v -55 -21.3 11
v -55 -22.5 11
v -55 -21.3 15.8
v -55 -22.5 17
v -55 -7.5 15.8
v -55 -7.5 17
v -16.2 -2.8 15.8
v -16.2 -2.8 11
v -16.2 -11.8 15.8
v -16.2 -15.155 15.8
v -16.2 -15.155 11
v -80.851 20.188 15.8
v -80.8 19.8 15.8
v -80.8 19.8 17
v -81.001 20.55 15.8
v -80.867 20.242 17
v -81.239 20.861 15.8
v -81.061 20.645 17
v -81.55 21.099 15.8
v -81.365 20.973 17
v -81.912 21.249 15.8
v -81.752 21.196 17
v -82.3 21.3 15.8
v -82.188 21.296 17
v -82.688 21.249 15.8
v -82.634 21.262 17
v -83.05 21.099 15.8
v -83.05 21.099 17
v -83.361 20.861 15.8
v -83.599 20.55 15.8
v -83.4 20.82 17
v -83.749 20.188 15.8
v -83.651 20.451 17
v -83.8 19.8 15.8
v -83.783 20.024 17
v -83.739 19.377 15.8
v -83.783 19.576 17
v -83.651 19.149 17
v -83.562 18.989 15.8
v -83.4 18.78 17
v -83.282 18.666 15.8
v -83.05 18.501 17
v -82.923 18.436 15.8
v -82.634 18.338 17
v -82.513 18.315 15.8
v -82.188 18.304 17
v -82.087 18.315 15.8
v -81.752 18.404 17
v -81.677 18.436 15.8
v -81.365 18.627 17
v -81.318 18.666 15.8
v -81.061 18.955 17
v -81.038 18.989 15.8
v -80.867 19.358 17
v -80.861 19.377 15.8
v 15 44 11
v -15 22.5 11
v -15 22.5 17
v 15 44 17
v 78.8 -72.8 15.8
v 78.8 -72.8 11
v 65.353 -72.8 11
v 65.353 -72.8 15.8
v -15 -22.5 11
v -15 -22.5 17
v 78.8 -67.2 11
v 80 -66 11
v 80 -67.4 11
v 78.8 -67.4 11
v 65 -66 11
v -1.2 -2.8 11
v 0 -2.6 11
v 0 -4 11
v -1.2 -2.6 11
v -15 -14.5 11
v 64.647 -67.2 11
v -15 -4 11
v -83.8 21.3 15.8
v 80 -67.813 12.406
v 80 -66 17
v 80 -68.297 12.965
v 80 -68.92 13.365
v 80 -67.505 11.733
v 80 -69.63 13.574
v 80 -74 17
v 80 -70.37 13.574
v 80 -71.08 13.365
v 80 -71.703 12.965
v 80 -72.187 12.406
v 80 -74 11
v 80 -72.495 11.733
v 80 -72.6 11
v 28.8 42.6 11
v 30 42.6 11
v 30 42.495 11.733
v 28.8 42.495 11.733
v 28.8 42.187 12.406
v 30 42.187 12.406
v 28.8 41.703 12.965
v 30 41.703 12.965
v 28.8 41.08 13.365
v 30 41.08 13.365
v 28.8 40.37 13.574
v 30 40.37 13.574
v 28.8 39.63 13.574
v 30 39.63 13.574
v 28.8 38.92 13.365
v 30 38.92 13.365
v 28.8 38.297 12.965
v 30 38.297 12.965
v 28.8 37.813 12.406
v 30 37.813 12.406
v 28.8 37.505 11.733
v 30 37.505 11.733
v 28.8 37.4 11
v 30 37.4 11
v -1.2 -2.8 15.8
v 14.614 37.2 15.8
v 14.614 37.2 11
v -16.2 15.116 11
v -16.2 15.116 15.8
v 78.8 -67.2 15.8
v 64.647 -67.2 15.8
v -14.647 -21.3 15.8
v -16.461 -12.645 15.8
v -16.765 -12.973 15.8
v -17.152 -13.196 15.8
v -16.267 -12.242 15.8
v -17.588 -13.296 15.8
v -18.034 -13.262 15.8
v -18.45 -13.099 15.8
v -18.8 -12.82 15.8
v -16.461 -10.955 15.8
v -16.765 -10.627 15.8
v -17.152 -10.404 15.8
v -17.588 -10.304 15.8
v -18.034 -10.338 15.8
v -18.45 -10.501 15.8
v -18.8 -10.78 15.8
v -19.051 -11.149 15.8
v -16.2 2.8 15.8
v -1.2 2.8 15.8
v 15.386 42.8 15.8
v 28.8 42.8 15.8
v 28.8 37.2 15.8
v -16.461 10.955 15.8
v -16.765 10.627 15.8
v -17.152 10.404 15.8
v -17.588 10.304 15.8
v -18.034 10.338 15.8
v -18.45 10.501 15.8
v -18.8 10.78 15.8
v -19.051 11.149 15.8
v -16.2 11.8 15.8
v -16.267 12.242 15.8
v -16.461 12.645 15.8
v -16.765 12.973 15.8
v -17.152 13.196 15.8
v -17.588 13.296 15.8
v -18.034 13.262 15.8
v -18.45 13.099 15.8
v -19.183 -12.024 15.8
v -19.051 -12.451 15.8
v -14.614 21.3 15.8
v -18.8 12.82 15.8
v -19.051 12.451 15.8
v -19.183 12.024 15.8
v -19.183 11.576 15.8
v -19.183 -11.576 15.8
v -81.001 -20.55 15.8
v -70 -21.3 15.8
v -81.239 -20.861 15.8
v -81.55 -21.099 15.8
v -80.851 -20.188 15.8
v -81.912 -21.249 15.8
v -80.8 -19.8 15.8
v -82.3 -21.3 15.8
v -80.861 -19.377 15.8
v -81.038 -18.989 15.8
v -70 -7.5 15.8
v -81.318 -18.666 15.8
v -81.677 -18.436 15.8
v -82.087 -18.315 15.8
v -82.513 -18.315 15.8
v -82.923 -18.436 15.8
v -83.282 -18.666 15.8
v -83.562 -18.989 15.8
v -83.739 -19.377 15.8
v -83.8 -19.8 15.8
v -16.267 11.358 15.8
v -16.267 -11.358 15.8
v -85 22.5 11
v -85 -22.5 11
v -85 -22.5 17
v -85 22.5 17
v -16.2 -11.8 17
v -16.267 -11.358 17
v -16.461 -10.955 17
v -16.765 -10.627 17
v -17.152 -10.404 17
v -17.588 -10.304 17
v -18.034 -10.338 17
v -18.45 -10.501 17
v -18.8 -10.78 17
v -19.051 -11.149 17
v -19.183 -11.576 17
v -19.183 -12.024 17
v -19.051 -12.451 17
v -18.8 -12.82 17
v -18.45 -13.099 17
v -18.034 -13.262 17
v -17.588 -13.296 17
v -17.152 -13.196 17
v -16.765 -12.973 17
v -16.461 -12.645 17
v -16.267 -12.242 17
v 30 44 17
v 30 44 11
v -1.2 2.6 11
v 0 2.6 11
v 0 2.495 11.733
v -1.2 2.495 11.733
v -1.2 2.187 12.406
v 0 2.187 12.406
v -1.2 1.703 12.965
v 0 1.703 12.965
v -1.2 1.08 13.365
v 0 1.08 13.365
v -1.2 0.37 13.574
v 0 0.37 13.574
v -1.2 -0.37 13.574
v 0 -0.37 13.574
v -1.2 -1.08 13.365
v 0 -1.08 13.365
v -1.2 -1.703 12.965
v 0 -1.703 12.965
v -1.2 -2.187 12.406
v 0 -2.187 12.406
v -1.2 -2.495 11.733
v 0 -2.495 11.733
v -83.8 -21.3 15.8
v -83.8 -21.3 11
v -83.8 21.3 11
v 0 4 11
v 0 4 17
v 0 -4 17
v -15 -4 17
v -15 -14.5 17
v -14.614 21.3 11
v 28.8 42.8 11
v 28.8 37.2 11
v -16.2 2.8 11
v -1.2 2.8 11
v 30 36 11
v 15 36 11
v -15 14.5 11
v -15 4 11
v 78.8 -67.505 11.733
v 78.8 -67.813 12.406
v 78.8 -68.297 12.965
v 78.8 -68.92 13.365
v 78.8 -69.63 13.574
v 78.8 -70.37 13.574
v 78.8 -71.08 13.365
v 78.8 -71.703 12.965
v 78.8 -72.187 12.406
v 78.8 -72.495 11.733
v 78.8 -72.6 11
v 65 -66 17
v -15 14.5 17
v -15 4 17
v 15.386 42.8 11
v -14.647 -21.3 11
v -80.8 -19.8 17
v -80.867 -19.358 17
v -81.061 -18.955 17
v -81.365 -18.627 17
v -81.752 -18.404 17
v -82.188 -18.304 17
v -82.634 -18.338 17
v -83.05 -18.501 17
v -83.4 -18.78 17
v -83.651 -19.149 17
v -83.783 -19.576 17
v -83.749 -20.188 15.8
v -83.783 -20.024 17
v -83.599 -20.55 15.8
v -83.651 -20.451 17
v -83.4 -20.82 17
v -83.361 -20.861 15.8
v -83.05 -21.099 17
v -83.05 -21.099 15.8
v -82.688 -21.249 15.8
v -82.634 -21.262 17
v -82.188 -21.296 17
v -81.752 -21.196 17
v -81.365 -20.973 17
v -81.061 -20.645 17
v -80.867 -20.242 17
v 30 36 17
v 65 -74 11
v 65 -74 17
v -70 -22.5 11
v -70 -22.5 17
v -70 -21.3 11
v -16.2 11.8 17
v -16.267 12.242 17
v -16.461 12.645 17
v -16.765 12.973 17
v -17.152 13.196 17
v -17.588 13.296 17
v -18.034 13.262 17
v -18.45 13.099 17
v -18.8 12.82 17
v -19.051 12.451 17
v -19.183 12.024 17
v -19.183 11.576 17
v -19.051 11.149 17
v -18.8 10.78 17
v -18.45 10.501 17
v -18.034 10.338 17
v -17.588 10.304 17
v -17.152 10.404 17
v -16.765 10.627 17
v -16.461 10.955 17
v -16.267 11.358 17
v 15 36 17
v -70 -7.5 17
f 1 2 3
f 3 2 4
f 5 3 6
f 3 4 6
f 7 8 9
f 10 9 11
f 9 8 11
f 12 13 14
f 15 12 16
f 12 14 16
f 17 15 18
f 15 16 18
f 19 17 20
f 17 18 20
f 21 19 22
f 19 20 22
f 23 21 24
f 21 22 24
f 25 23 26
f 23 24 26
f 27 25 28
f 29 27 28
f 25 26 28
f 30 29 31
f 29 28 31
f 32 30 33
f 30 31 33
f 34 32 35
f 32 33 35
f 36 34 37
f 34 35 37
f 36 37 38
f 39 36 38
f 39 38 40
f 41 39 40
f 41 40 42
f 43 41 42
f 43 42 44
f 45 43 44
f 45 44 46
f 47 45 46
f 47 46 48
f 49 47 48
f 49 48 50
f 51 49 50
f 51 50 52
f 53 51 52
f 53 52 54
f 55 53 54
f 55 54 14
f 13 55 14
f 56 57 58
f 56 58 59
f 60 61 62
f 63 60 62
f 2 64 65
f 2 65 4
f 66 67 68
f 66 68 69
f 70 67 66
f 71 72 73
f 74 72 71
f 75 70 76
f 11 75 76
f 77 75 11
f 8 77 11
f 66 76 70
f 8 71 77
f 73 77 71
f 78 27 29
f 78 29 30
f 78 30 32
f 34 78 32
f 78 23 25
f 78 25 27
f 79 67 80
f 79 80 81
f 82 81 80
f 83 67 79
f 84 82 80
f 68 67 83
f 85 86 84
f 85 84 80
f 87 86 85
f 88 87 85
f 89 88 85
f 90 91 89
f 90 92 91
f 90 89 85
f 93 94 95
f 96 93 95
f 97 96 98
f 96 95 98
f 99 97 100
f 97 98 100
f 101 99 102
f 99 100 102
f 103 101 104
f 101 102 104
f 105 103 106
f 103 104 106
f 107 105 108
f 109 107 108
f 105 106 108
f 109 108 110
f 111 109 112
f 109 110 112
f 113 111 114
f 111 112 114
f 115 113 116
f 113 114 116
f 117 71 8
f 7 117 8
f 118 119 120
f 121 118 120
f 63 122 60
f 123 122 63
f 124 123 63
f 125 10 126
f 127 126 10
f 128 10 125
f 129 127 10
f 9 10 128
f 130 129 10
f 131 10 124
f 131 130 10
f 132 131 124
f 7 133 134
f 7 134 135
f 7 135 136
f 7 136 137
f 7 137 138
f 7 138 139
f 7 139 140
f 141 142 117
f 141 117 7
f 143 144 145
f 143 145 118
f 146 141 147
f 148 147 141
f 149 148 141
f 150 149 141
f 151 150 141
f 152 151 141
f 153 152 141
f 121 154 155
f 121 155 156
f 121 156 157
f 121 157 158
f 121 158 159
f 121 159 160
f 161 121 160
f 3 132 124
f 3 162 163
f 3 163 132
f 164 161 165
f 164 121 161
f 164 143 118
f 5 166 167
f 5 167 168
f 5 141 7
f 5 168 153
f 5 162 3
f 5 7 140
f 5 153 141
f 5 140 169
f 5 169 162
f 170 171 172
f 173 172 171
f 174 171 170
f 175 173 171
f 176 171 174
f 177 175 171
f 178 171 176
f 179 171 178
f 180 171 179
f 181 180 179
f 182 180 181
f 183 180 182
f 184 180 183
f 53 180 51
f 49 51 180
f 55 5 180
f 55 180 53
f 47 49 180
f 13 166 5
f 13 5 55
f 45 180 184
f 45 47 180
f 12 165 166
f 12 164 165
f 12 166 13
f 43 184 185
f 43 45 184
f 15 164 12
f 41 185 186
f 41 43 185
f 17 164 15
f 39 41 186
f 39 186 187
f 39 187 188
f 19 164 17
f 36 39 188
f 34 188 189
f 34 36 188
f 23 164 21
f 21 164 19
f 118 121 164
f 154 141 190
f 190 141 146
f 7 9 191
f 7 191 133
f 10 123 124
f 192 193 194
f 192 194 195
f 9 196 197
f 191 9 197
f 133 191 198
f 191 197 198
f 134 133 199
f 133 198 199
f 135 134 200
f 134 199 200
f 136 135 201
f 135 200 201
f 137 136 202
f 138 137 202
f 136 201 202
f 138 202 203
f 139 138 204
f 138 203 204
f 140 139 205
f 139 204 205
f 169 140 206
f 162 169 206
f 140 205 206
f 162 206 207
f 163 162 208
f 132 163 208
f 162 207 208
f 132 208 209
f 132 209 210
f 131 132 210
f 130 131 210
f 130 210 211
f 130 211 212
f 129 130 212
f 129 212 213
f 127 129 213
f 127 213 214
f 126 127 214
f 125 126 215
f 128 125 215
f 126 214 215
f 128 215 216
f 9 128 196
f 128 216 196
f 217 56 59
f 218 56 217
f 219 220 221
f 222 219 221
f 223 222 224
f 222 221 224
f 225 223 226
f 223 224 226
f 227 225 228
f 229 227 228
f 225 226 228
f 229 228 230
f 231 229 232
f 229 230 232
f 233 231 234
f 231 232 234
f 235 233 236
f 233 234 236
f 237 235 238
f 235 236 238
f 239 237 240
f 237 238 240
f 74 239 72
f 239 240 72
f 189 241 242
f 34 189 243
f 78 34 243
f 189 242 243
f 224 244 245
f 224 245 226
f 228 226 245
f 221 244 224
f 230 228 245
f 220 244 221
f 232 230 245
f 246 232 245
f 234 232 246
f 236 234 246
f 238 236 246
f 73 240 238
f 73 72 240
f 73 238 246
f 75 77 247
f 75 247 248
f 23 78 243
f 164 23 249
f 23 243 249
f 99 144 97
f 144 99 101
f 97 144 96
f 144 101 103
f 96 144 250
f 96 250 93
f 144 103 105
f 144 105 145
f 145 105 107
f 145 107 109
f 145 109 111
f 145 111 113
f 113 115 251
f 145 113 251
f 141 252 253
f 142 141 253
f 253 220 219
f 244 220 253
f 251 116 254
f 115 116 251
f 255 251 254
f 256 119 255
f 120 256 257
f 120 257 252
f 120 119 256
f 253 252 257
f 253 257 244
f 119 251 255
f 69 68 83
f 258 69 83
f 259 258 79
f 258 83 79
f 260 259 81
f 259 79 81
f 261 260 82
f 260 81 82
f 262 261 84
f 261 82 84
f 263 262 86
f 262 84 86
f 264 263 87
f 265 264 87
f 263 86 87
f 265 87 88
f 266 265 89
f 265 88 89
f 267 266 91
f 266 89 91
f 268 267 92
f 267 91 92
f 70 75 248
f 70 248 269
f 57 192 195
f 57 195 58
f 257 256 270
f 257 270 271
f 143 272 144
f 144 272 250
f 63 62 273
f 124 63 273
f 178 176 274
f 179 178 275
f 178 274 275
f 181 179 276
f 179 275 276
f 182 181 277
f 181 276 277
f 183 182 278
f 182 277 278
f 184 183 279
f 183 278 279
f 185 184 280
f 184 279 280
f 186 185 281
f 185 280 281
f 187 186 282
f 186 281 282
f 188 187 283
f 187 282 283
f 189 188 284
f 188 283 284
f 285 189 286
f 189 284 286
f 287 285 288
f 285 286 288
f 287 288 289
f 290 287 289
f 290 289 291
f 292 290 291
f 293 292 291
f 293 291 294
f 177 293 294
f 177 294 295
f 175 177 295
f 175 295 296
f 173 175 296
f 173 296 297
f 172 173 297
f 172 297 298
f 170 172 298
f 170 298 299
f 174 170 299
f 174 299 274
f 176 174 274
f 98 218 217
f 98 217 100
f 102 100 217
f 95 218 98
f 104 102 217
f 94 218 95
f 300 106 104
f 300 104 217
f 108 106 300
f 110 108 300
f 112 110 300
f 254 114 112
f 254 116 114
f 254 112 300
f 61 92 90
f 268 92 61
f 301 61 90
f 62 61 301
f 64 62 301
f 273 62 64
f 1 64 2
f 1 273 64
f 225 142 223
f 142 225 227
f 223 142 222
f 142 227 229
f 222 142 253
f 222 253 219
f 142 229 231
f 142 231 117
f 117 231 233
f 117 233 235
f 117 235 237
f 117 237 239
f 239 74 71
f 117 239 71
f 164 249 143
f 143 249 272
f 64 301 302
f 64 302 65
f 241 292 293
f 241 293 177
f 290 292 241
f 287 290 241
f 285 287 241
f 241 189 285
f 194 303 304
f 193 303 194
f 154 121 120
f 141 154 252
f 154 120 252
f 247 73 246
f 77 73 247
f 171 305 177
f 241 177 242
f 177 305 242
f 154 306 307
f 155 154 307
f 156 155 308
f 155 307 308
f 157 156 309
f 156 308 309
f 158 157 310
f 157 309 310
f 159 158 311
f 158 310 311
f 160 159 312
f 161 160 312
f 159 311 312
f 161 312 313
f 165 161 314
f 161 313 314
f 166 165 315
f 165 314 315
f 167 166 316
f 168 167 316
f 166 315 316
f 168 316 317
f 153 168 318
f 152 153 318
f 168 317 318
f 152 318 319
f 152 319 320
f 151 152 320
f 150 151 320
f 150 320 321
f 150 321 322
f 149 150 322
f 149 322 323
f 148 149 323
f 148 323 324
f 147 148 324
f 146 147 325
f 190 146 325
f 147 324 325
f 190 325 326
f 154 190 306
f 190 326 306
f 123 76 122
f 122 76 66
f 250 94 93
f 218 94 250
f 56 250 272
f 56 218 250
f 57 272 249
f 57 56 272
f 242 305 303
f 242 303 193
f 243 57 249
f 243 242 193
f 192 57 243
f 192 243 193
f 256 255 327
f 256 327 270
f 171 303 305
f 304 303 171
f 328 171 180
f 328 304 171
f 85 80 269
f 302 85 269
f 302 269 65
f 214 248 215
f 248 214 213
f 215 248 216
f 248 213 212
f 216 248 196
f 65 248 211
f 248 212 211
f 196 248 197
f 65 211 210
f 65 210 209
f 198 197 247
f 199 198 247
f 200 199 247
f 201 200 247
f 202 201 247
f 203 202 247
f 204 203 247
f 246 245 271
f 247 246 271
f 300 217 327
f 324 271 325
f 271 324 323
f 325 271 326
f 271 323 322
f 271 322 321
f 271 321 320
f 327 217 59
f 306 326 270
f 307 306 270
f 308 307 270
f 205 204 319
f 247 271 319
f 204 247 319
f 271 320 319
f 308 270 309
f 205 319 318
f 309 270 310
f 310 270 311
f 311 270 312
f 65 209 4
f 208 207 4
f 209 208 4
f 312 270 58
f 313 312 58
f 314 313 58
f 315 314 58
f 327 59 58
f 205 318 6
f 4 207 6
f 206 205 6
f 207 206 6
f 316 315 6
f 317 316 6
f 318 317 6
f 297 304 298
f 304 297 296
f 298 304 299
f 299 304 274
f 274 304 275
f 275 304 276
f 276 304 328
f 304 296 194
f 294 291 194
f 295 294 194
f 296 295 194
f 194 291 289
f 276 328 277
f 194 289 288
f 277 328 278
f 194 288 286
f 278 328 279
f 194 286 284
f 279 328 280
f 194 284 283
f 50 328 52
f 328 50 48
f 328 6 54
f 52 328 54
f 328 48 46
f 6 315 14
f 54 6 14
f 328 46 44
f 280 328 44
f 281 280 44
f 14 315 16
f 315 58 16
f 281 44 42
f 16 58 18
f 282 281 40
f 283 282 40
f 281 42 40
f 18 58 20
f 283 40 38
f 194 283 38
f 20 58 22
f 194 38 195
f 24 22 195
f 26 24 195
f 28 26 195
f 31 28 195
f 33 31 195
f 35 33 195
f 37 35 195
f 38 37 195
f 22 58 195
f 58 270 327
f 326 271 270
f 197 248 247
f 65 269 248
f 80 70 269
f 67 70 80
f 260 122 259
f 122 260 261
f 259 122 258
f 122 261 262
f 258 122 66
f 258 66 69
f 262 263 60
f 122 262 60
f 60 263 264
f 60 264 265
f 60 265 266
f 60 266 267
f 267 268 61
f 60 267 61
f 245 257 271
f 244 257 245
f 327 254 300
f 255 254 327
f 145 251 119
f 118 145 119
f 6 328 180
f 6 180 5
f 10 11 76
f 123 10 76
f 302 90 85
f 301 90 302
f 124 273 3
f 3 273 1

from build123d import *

# Parameters (mm, degrees)
PAD001_DEPTH    = 6
THICKNESS001_T  = -1.2
SKETCH011_R     = 1.5
POCKET003_DEPTH = 1.2
SKETCH012_W     = 15
SKETCH012_H     = 15
POCKET004_DEPTH = 6.001
SKETCH013_R     = 2.6
POCKET005_DEPTH = 1.2
SKETCH014_R     = 2.6
POCKET006_DEPTH = 1.2
SKETCH015_R     = 2.6
POCKET007_DEPTH = 1.2


with BuildPart() as part:
    # Sketch004 → Pad001 (new body)
    with BuildSketch(Plane.XY):
        Polygon((80, -74), (65, -74), (-15, -22.5), (-85, -22.5), (-85, 22.5), (-15, 22.5), (15, 44), (30, 44), (30, 36), (15, 36), (-15, 14.5), (-15, 4), (0, 4), (0, -4), (-15, -4), (-15, -14.5), (65, -66), (80, -66), align=None)
    extrude(amount=PAD001_DEPTH)

    # Thickness001
    thickness001_openings = [part.faces().sort_by_distance(p)[0] for p in [
        (-29.840547, -5.671982, 0),
    ]]
    offset(amount=THICKNESS001_T, openings=thickness001_openings, kind=Kind.INTERSECTION)

    # Sketch011 (on Face19 of Thickness001) → Pocket003 (cut)
    with BuildSketch(Plane.XY.offset(6)):
        with Locations((-82.3, 19.8)):
            Circle(SKETCH011_R)
        with Locations((-82.3, -19.8)):
            Circle(SKETCH011_R)
        with Locations((-17.7, 11.8)):
            Circle(SKETCH011_R)
        with Locations((-17.7, -11.8)):
            Circle(SKETCH011_R)
    extrude(amount=-POCKET003_DEPTH, mode=Mode.SUBTRACT)

    # Sketch012 (on Face5 of Pocket003) → Pocket004 (cut, through all)
    with BuildSketch(Plane.XY.offset(6)):
        with Locations((-62.5, -15)):
            Rectangle(SKETCH012_W, SKETCH012_H)
    extrude(amount=-POCKET004_DEPTH, mode=Mode.SUBTRACT)

    # Sketch013 (on Face16 of Pocket004) → Pocket005 (cut)
    with BuildSketch(Plane.YZ.offset(30)):
        with Locations((40, 0)):
            Circle(SKETCH013_R)
    extrude(amount=-POCKET005_DEPTH, mode=Mode.SUBTRACT)

    # Sketch014 (on Face11 of Pocket005) → Pocket006 (cut)
    with BuildSketch(Plane.YZ):
        Circle(SKETCH014_R)
    extrude(amount=-POCKET006_DEPTH, mode=Mode.SUBTRACT)

    # Sketch015 (on Face2 of Pocket006) → Pocket007 (cut)
    with BuildSketch(Plane.YZ.offset(80)):
        with Locations((-70, 0)):
            Circle(SKETCH015_R)
    extrude(amount=-POCKET007_DEPTH, mode=Mode.SUBTRACT)


with BuildPart() as part_1:
    # Body001 placement: moved
    add(part.part.moved(Location((0, 0, 11))))


solid = part_1.part
